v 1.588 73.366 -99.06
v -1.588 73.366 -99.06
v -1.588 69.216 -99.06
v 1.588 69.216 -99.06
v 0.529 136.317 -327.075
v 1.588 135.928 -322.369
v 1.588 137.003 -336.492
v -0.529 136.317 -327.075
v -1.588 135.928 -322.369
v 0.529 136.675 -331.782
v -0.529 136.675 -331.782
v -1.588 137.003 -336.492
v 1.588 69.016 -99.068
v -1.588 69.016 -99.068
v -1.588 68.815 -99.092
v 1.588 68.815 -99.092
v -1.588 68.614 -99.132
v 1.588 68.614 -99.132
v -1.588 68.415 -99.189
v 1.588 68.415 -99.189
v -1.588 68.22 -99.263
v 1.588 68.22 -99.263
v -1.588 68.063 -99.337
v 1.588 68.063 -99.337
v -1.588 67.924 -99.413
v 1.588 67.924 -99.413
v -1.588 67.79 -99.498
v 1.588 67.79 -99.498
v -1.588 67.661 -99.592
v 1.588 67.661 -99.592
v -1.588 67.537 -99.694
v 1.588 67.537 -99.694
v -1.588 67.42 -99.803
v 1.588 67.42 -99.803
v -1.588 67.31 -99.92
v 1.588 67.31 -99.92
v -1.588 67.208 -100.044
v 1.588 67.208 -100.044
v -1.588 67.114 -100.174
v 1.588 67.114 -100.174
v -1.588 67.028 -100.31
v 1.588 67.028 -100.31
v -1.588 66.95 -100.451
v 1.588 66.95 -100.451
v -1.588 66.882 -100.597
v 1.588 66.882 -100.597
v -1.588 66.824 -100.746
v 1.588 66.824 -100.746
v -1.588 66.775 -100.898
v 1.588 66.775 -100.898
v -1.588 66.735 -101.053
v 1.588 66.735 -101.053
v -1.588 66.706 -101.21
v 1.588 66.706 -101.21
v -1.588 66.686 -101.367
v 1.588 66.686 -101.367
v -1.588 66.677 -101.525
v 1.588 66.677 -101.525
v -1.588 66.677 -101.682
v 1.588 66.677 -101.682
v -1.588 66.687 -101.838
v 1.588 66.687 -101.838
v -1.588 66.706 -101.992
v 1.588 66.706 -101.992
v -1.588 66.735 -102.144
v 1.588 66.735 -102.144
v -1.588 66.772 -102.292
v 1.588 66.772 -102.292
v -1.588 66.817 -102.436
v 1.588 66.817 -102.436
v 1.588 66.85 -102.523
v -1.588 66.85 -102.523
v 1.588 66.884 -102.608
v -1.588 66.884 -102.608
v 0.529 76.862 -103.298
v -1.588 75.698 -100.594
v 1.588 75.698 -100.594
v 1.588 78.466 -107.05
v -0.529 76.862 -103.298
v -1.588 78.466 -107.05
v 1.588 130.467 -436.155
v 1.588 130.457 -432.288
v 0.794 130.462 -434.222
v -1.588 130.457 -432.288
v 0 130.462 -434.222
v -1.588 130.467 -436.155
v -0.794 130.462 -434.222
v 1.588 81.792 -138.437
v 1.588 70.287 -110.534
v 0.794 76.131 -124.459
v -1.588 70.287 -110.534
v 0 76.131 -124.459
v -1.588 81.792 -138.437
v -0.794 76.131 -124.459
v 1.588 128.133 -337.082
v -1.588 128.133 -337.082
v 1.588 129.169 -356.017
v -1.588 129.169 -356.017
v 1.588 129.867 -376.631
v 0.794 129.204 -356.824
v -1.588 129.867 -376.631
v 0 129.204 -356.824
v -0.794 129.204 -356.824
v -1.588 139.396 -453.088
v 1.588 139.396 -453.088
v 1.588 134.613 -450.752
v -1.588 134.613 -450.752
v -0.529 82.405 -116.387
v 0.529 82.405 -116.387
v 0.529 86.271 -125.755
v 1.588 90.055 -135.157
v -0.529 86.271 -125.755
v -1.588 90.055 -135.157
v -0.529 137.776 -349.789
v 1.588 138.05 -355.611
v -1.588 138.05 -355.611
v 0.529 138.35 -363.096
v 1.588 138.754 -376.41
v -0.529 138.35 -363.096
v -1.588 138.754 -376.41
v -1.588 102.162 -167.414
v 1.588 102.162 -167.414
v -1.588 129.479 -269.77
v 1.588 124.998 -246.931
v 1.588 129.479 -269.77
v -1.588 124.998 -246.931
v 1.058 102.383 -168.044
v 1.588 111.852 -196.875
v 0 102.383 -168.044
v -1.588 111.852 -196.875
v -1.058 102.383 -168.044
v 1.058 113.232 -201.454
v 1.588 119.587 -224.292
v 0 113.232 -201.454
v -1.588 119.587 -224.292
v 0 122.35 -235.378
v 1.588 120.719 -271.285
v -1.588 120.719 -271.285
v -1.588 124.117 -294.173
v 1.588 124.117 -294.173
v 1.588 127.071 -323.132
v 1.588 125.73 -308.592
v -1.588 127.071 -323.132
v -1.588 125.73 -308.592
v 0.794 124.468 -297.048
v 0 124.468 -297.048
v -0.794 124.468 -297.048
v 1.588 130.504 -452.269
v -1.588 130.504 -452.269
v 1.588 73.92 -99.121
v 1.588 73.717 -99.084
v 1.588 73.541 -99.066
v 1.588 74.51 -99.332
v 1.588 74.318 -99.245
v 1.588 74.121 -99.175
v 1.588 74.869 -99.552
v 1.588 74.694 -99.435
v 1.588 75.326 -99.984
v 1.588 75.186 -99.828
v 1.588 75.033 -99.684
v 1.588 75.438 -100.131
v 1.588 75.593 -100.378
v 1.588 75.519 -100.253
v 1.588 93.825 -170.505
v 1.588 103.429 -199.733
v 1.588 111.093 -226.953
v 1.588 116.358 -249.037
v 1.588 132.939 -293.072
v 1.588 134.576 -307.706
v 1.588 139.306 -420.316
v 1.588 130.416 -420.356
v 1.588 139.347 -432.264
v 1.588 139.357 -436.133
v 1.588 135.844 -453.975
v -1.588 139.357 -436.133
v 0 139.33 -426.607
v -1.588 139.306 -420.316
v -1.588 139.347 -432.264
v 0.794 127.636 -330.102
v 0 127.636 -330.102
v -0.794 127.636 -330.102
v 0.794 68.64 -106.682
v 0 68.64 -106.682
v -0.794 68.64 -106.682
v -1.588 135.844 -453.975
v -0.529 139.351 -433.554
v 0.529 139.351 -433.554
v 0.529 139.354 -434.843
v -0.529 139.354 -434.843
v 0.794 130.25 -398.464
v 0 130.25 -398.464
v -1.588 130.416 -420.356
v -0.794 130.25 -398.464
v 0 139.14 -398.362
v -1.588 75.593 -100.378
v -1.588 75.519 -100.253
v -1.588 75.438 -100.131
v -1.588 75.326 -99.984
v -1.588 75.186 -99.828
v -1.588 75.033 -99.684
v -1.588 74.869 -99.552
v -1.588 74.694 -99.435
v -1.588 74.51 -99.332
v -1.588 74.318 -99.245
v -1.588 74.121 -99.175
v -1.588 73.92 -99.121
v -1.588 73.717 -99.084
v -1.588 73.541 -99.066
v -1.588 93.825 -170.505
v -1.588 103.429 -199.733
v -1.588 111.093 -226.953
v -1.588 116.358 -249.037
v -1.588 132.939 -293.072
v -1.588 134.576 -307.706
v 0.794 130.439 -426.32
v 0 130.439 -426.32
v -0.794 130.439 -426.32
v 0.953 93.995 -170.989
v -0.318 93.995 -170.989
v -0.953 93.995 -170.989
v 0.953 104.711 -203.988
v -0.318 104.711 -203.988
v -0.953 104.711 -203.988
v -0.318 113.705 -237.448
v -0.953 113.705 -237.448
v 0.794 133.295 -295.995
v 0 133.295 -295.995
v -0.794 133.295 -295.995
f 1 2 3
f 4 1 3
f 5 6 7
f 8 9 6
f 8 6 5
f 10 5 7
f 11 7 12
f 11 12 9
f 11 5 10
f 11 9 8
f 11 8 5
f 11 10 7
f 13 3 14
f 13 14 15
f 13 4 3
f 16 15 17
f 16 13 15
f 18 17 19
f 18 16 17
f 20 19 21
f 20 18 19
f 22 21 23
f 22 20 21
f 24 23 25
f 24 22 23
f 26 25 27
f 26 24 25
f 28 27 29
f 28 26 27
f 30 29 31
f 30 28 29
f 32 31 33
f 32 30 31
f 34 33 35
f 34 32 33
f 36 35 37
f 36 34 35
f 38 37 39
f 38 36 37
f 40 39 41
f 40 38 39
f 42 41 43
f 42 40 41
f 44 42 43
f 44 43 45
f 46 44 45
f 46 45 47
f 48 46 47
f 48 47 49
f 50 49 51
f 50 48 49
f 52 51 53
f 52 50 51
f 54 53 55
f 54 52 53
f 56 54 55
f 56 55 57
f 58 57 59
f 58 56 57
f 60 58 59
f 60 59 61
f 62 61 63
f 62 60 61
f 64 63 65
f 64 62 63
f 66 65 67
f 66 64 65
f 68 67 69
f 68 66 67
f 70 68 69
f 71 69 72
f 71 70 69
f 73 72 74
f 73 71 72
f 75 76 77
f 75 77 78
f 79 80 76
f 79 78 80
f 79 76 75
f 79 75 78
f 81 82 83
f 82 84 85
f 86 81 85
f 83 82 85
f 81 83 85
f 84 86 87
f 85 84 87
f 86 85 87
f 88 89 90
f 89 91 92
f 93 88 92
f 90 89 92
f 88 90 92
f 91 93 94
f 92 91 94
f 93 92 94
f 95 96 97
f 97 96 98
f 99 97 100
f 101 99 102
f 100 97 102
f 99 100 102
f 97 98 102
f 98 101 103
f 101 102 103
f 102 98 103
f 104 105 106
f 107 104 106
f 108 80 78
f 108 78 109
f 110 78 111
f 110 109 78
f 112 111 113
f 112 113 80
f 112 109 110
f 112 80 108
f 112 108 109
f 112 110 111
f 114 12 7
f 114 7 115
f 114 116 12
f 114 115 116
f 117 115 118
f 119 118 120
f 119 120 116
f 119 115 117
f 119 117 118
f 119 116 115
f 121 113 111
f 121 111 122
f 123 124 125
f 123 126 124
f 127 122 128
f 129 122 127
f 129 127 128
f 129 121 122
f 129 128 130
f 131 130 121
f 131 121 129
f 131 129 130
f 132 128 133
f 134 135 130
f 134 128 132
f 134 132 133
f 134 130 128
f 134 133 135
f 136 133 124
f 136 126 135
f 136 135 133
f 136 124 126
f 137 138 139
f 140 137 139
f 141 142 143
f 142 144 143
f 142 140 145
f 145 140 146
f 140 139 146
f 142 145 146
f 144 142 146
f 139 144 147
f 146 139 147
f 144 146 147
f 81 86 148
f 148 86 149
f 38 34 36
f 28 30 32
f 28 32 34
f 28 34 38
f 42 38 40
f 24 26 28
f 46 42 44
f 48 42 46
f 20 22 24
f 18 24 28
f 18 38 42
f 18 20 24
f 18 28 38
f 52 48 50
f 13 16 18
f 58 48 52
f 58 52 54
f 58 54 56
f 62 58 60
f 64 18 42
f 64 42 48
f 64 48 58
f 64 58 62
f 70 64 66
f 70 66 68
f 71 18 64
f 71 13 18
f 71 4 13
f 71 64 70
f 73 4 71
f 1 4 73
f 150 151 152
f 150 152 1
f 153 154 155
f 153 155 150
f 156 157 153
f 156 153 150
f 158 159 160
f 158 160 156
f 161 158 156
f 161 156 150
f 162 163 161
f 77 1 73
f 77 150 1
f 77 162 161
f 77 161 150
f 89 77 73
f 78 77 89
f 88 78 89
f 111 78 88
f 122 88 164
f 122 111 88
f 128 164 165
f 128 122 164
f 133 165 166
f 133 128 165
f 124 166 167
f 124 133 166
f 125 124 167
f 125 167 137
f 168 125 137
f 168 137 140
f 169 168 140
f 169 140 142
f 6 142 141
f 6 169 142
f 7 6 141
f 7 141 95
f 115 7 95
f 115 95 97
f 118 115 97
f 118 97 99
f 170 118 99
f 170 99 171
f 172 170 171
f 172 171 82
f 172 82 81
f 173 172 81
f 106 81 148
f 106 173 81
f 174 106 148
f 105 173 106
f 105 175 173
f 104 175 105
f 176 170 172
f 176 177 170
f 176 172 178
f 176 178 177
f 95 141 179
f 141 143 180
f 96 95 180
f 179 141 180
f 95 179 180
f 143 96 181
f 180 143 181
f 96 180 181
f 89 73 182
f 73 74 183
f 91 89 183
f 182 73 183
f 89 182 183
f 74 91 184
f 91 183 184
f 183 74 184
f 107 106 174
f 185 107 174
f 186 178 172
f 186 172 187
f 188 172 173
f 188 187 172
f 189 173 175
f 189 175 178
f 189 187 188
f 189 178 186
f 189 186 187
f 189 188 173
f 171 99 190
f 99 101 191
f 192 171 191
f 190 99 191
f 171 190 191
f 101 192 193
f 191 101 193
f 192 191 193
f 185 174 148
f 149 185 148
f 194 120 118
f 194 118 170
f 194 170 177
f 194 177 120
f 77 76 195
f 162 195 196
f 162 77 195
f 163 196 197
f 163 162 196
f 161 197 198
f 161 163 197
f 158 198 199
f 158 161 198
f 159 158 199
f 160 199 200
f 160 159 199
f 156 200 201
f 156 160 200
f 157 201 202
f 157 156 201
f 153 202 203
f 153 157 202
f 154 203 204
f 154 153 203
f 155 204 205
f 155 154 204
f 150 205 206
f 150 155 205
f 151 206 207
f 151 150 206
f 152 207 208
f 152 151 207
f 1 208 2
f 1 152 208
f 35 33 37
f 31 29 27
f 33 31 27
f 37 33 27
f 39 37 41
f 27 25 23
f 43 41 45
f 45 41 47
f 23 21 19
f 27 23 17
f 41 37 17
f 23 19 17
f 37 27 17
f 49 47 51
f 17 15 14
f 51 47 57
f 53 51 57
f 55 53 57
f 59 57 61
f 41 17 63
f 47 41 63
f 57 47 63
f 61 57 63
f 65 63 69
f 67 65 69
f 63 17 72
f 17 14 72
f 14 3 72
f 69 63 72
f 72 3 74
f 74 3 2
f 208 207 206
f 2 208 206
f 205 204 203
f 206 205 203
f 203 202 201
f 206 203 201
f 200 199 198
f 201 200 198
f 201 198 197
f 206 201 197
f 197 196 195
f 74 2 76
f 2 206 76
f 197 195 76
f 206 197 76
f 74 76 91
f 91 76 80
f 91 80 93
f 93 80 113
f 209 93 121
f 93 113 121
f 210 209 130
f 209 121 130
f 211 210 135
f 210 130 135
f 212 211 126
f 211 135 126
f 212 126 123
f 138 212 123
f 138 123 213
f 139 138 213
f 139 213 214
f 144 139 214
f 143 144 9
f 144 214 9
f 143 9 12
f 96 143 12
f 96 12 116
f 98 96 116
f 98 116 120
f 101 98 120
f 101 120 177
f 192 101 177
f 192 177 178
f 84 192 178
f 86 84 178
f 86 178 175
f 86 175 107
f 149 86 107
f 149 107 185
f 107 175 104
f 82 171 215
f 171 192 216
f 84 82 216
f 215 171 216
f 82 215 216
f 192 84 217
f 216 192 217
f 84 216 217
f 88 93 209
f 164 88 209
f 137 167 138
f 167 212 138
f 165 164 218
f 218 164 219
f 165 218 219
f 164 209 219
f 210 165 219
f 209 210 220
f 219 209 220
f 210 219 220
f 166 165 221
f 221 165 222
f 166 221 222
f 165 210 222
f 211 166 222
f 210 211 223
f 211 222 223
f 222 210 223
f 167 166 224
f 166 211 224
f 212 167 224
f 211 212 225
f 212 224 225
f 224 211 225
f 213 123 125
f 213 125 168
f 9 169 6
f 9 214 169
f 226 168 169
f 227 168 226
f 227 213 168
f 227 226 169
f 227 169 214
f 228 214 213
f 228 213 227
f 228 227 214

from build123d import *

# Parameters (mm, degrees)
BOSS_EXTRUDE1_START = -1.5875
BOSS_EXTRUDE1_DEPTH = 3.175
FILLET1_R           = 2.54
CUT_EXTRUDE1_DEPTH  = 2674.191025632
FILLET2_R           = 0.762
FILLET3_R           = 0.762
CUT_EXTRUDE2_DEPTH  = 7.62


with BuildPart() as part:
    # Boss-Extrude1: read off the stored shape, not the designer's step
    # Boss-Extrude1 outline → Boss-Extrude1 (new body)
    with BuildSketch(Plane(origin=(0, 0, 0), x_dir=(0, 0, -1), z_dir=(1, 0, 0)).offset(BOSS_EXTRUDE1_START)):
        with BuildLine():
            add(Edge.make_bspline(
                [(1110.404970926, 130.384545774), (1120.170834465, 130.370061323), (1139.703057908, 130.338772026), (1168.998370974, 130.277673039), (1198.290610395, 130.194386876), (1217.81419633, 130.113940836), (1227.576506903, 130.06508052)],
                knots=[0, 0, 0, 0, 0.25, 0.5, 0.75, 1, 1, 1, 1], degree=3))
            add(Edge.make_bspline(
                [(1227.576506903, 130.06508052), (1269.911205773, 129.853195249), (1333.427746701, 129.273373321), (1418.042208161, 127.449050563), (1502.665994832, 124.913583682), (1608.454176987, 120.803299479), (1693.070073331, 116.848243245), (1735.369787733, 114.744712179)],
                knots=[0, 0, 0, 0, 0.25, 0.375, 0.5, 0.75, 1, 1, 1, 1], degree=3))
            add(Edge.make_bspline(
                [(1735.369787733, 114.744712179), (1815.995940723, 110.735232018), (1936.906650462, 104.096364548), (2098.049485168, 94.18797875), (2198.694736725, 87.314638509), (2279.130413747, 81.114418931), (2339.412950304, 76.034076608), (2399.564054334, 70.28270545), (2479.570468264, 61.127378254), (2559.292087872, 49.650907614), (2626.797554585, 38.235484735), (2656.889518578, 32.788503969), (2667.159793662, 30.877771266), (2669.54, 30.432069924)],
                knots=[0, 0, 0, 0, 0.25, 0.375, 0.5, 0.5625, 0.625, 0.6875, 0.75, 0.875, 0.9375, 0.96241067, 0.969928536, 0.969928536, 0.969928536, 0.969928536], degree=3))
            Line((2669.54, 30.432069924), (2669.54, 39.476142465))
            add(Edge.make_bspline(
                [(1735.811334709, 123.623740069), (1776.138635499, 121.618292624), (1816.460281579, 119.500621806), (1897.093668675, 115.087561885), (1937.405638896, 112.792971084), (2018.018419045, 108.018366523), (2058.319512223, 105.539122976), (2138.903780144, 100.307240032), (2179.18739793, 97.555127955), (2239.586998714, 93.080168687), (2259.716280977, 91.529837622), (2289.900442602, 89.09084343), (2299.960179135, 88.258845039), (2320.076004566, 86.552861654), (2330.132100898, 85.678962223), (2350.239356518, 83.874334847), (2360.290489794, 82.943307484), (2380.385973971, 81.003183297), (2390.430065378, 79.993418555), (2420.547026195, 76.827577532), (2440.60648589, 74.533672955), (2480.675569568, 69.556278523), (2500.68715183, 66.874150811), (2540.654290207, 61.150246295), (2560.611026428, 58.109755646), (2600.475457131, 51.702465574), (2620.382967089, 48.337538888), (2650.028116889, 43.072156367), (2659.78844051, 41.29687683), (2669.54, 39.476142465)],
                knots=[0, 0, 0, 0, 0.125, 0.125, 0.25, 0.25, 0.375, 0.375, 0.5, 0.5, 0.5625, 0.5625, 0.59375, 0.59375, 0.625, 0.625, 0.65625, 0.65625, 0.6875, 0.6875, 0.75, 0.75, 0.8125, 0.8125, 0.875, 0.875, 0.9375, 0.9375, 0.968210768, 0.968210768, 0.968210768, 0.968210768], degree=3))
            add(Edge.make_bspline(
                [(1227.621000751, 138.954969175), (1248.807303679, 138.848931677), (1269.993583155, 138.701170252), (1312.363832348, 138.270664618), (1333.547719008, 137.987407832), (1375.912368189, 137.249274813), (1397.09309738, 136.7925677), (1439.451328259, 135.701855835), (1460.629010312, 135.069210584), (1502.979101161, 133.670541385), (1524.152152736, 132.907434339), (1566.494303759, 131.284732459), (1587.663166024, 130.423163385), (1651.164052809, 127.709123983), (1693.490421561, 125.728325331), (1735.811334709, 123.623740069)],
                knots=[0, 0, 0, 0, 0.125, 0.125, 0.25, 0.25, 0.375, 0.375, 0.5, 0.5, 0.625, 0.625, 0.75, 0.75, 1, 1, 1, 1], degree=3))
            add(Edge.make_bspline(
                [(1110.418156307, 139.274535996), (1129.952027249, 139.245563914), (1149.485893504, 139.211997476), (1188.553558893, 139.115899087), (1208.087346834, 139.052735015), (1227.621000751, 138.954969175)],
                knots=[0, 0, 0, 0, 0.5, 0.5, 1, 1, 1, 1], degree=3))
            add(Edge.make_bspline(
                [(768.740124165, 138.468408213), (782.976796045, 138.460280143), (797.213453801, 138.479500079), (825.686695051, 138.549690296), (839.923258916, 138.600062665), (868.396318956, 138.719026333), (882.632808962, 138.789607972), (911.105746117, 138.939594729), (925.342197007, 139.018479563), (953.81517223, 139.160090703), (968.051699178, 139.222241505), (996.524919377, 139.30995407), (1010.761605517, 139.335014039), (1039.234912871, 139.349647552), (1053.471562869, 139.340493535), (1081.944860968, 139.313691902), (1096.181508981, 139.29565137), (1110.418156307, 139.274535996)],
                knots=[0, 0, 0, 0, 0.125, 0.125, 0.25, 0.25, 0.375, 0.375, 0.5, 0.5, 0.625, 0.625, 0.75, 0.75, 0.875, 0.875, 1, 1, 1, 1], degree=3))
            add(Edge.make_bspline(
                [(630.778432202, 139.251437536), (653.771819614, 139.075315664), (676.765000849, 138.871740519), (711.255349111, 138.647690701), (722.752238945, 138.586174182), (745.746099074, 138.499784896), (757.243084259, 138.474972158), (768.740124165, 138.468408213)],
                knots=[0, 0, 0, 0, 0.5, 0.5, 0.75, 0.75, 1, 1, 1, 1], degree=3))
            add(Edge.make_bspline(
                [(604.514984259, 139.433685568), (609.940743136, 139.400696354), (618.695242427, 139.342071397), (627.449694696, 139.276935028), (630.778432202, 139.251437536)],
                knots=[0, 0, 0, 0, 0.619765686, 1, 1, 1, 1], degree=3))
            ThreePointArc((604.514984259, 139.433685568), (600.549356142, 139.457173081), (596.583720644, 139.479379304))
            add(Edge.make_bspline(
                [(436.133018826, 139.357176562), (449.50393779, 139.390650739), (462.874888934, 139.412366015), (489.61665939, 139.498555977), (502.987497127, 139.559076553), (529.729299233, 139.628029754), (543.100240501, 139.639230481), (569.84212102, 139.601013959), (583.212960696, 139.552035302), (596.583720644, 139.479379304)],
                knots=[0, 0, 0, 0, 0.25, 0.25, 0.5, 0.5, 0.75, 0.75, 1, 1, 1, 1], degree=3))
            add(Edge.make_bspline(
                [(432.263917423, 139.347117104), (433.553617637, 139.350567112), (434.843318039, 139.353947814), (436.133018826, 139.357176562)],
                knots=[0, 0, 0, 0, 1, 1, 1, 1], degree=3))
            add(Edge.make_bspline(
                [(420.316232014, 139.305761868), (422.413235913, 139.315186344), (426.395793967, 139.330351666), (430.378363115, 139.342073082), (432.263917423, 139.347117104)],
                knots=[0, 0, 0, 0, 0.526548575, 1, 1, 1, 1], degree=3))
            add(Edge.make_bspline(
                [(376.410119779, 138.75403864), (383.726317086, 138.935561778), (391.043801196, 139.055611797), (405.679602634, 139.224192856), (412.997895507, 139.272871444), (420.316232014, 139.305761868)],
                knots=[0, 0, 0, 0, 0.5, 0.5, 1, 1, 1, 1], degree=3))
            add(Edge.make_bspline(
                [(336.49221538, 137.002990798), (349.782924989, 137.88646357), (363.094318653, 138.423658969), (376.410119779, 138.75403864)],
                knots=[0, 0, 0, 0, 1, 1, 1, 1], degree=3))
            add(Edge.make_bspline(
                [(322.369488076, 135.928469458), (327.073374868, 136.333386449), (331.781331813, 136.689844531), (336.49221538, 137.002990798)],
                knots=[0, 0, 0, 0, 1, 1, 1, 1], degree=3))
            add(Edge.make_bspline(
                [(269.769949315, 129.47895505), (274.123387467, 130.231879276), (278.485668028, 130.925946417), (287.22796256, 132.196043087), (291.608626646, 132.771988738), (300.381777496, 133.818422146), (304.774579419, 134.288963443), (313.567800313, 135.154375086), (317.967903853, 135.549407043), (322.369488076, 135.928469458)],
                knots=[0, 0, 0, 0, 0.25, 0.25, 0.5, 0.5, 0.75, 0.75, 1, 1, 1, 1], degree=3))
            add(Edge.make_bspline(
                [(135.15718457, 90.054634926), (146.043739673, 94.375230064), (156.99891695, 98.504335222), (173.56622243, 104.322560697), (179.110932848, 106.199810145), (190.24859245, 109.819698901), (195.841545849, 111.562316625), (207.065472514, 114.901345648), (212.697969124, 116.49836249), (224.005973618, 119.540534541), (229.683240596, 120.9862349), (246.767187276, 125.077694043), (258.225188059, 127.482295924), (269.769949315, 129.47895505)],
                knots=[0, 0, 0, 0, 0.25, 0.25, 0.375, 0.375, 0.5, 0.5, 0.625, 0.625, 0.75, 0.75, 1, 1, 1, 1], degree=3))
            add(Edge.make_bspline(
                [(107.049744533, 78.466050261), (116.373258882, 82.438606419), (125.737350123, 86.316143859), (135.15718457, 90.054634926)],
                knots=[0, 0, 0, 0, 1, 1, 1, 1], degree=3))
            add(Edge.make_bspline(
                [(99.06, 75.03568963), (99.223542669, 75.106424562), (100.635498802, 75.716852689), (103.297453866, 76.863328103), (105.798503999, 77.932922637), (107.049744533, 78.466050261)],
                knots=[0.484151133, 0.484151133, 0.484151133, 0.484151133, 0.515864471, 0.757931449, 1, 1, 1, 1], degree=3))
            Line((99.06, 75.03568963), (99.06, 65.345043949))
            add(Edge.make_bspline(
                [(99.06, 65.345043949), (99.380370965, 65.484464523), (100.637671455, 66.031176319), (103.17753745, 67.132002814), (106.681577323, 68.64166857), (109.249580285, 69.740028797), (110.534459652, 70.287489229)],
                knots=[0.254738807, 0.254738807, 0.254738807, 0.254738807, 0.317238807, 0.5, 0.75, 1, 1, 1, 1], degree=3))
            add(Edge.make_bspline(
                [(110.534459652, 70.287489229), (112.850658013, 71.274373329), (117.489277519, 73.236837099), (124.456688526, 76.138068453), (131.438476528, 78.994265342), (136.101204469, 80.864754132), (138.436571012, 81.791601309)],
                knots=[0, 0, 0, 0, 0.25, 0.5, 0.75, 1, 1, 1, 1], degree=3))
            add(Edge.make_bspline(
                [(138.436571012, 81.791601309), (143.826897197, 83.930883835), (154.6522834, 88.11877139), (176.408203186, 96.037596764), (203.906835742, 104.998187521), (237.39469787, 114.027149543), (259.934818065, 118.755998441), (271.284977744, 120.719001348)],
                knots=[0, 0, 0, 0, 0.125, 0.25, 0.5, 0.75, 1, 1, 1, 1], degree=3))
            add(Edge.make_bspline(
                [(271.284977744, 120.719001348), (275.558711595, 121.458140765), (284.124297478, 122.821139095), (297.036360548, 124.518896272), (310.018420247, 125.909880891), (318.766623126, 126.695286194), (323.13209925, 127.071239405)],
                knots=[5e-09, 5e-09, 5e-09, 5e-09, 0.2499992, 0.4999984, 0.7499976, 0.999996801, 0.999996801, 0.999996801, 0.999996801], degree=3))
            add(Edge.make_bspline(
                [(323.13209925, 127.071239405), (324.293050056, 127.171175344), (326.615168427, 127.365043892), (330.101568176, 127.638529754), (333.590184216, 127.895089457), (335.917953069, 128.055198639), (337.081858513, 128.132566852)],
                knots=[1.2024e-05, 1.2024e-05, 1.2024e-05, 1.2024e-05, 0.250009018, 0.500006012, 0.750003006, 1, 1, 1, 1], degree=3))
            add(Edge.make_bspline(
                [(337.081858513, 128.132566852), (340.367862287, 128.350997241), (346.939906877, 128.744909116), (356.821319657, 129.221190111), (366.716250393, 129.595096292), (373.326613137, 129.784797569), (376.630622597, 129.866773678)],
                knots=[0, 0, 0, 0, 0.25, 0.5, 0.75, 1, 1, 1, 1], degree=3))
            add(Edge.make_bspline(
                [(376.630622597, 129.866773678), (380.266394474, 129.956981294), (387.534764147, 130.106779908), (398.462206547, 130.259361028), (409.400972015, 130.358727994), (416.705417778, 130.39944419), (420.356185481, 130.415851648)],
                knots=[0, 0, 0, 0, 0.25, 0.5, 0.75, 1, 1, 1, 1], degree=3))
            add(Edge.make_bspline(
                [(420.356185481, 130.415851648), (421.350045129, 130.420318309), (423.337533562, 130.428603137), (426.320174328, 130.439402209), (429.303468332, 130.448883952), (431.293011648, 130.454488038), (432.287698861, 130.457148912)],
                knots=[0, 0, 0, 0, 0.25, 0.5, 0.75, 1, 1, 1, 1], degree=3))
            add(Edge.make_bspline(
                [(432.287698861, 130.457148912), (432.610032304, 130.45801117), (433.254717136, 130.45972707), (434.221637716, 130.462266911), (435.188505114, 130.464765142), (435.833012253, 130.466397641), (436.155274747, 130.46720442)],
                knots=[9.2e-08, 9.2e-08, 9.2e-08, 9.2e-08, 0.25, 0.5, 0.75, 1, 1, 1, 1], degree=3))
            add(Edge.make_bspline(
                [(436.155274747, 130.46720442), (449.528322363, 130.500683927), (476.275740382, 130.546633815), (516.38896029, 130.728798697), (556.456290895, 130.759667498), (583.176533448, 130.662101975), (596.535396133, 130.589510646)],
                knots=[0, 0, 0, 0, 0.249999973, 0.499999946, 0.749999918, 0.999999891, 0.999999891, 0.999999891, 0.999999891], degree=3))
            ThreePointArc((596.535396133, 130.589510646), (600.498158983, 130.567320504), (604.460914457, 130.543849998))
            add(Edge.make_bspline(
                [(604.460914457, 130.543849998), (606.648150431, 130.530551362), (611.022503017, 130.502867011), (617.584689429, 130.458405465), (624.147187284, 130.411339888), (628.522663802, 130.378455494), (630.7103385, 130.361698324)],
                knots=[-7.09e-07, -7.09e-07, -7.09e-07, -7.09e-07, 0.249999468, 0.499999646, 0.749999823, 1, 1, 1, 1], degree=3))
            add(Edge.make_bspline(
                [(630.7103385, 130.361698324), (642.206126489, 130.273644326), (665.193556095, 130.083785311), (699.699077953, 129.819212193), (734.21504011, 129.634735151), (757.228597075, 129.58497898), (768.735048644, 129.578409662)],
                knots=[0, 0, 0, 0, 0.25, 0.5, 0.75, 1, 1, 1, 1], degree=3))
            add(Edge.make_bspline(
                [(768.735048644, 129.578409662), (797.222409768, 129.56214552), (854.203652026, 129.725124503), (939.635195481, 130.236578518), (1024.992958464, 130.524931921), (1081.937612336, 130.426767717), (1110.404970926, 130.384545774)],
                knots=[0, 0, 0, 0, 0.25, 0.5, 0.75, 1, 1, 1, 1], degree=3))
        make_face()
    extrude(amount=BOSS_EXTRUDE1_DEPTH)

    # Fillet1
    fillet1_edges = [part.edges().sort_by_distance(p)[0] for p in [
        (0, 39.476142465, -2669.54),
        (0, 30.432069924, -2669.54),
        (0, 65.345043949, -99.06),
        (0, 75.03568963, -99.06),
    ]]
    fillet(fillet1_edges, radius=FILLET1_R)

    # Sketch4 → Cut-Extrude1 (cut, through all)
    with BuildSketch(Plane(origin=(1.5875, 0, 0), x_dir=(0, 0, -1), z_dir=(1, 0, 0))):
        Polygon((1827.2125, 118.895836595), (1827.2125, 110.000384115), (1827.2125, 78.791710134), (2135.1875, 78.791710134), (2135.1875, 91.599357392), (2135.1875, 100.508307819), (2135.1875, 129.353842083), (1827.2125, 129.353842083), align=None)
    extrude(amount=-CUT_EXTRUDE1_DEPTH, mode=Mode.SUBTRACT)


with BuildPart() as cut_extrude1_piece_1:
    # of the separate pieces the step leaves, piece 1, a body of its own (cut_extrude1_pieces)
    add(part.part.solids().sort_by_distance((-1.5875, 114.744712179, -1735.369787733))[0])

    # Fillet2
    fillet2_edges = [cut_extrude1_piece_1.edges().sort_by_distance(p)[0] for p in [
        (0, 118.895836595, -1827.2125),
        (0, 110.000384116, -1827.2125),
    ]]
    fillet(fillet2_edges, radius=FILLET2_R)


with BuildPart() as cut_extrude1_piece_2:
    # of the separate pieces the step leaves, piece 2, a body of its own (cut_extrude1_pieces)
    add(part.part.solids().sort_by_distance((-1.5875, 91.599357392, -2135.1875))[0])

    # Fillet3
    fillet3_edges = [cut_extrude1_piece_2.edges().sort_by_distance(p)[0] for p in [
        (0, 100.508307819, -2135.1875),
        (0, 91.599357392, -2135.1875),
    ]]
    fillet(fillet3_edges, radius=FILLET3_R)


with BuildPart() as cut_extrude2_tool:
    # Sketch5 → Cut-Extrude2 (new body)
    with BuildSketch(Plane(origin=(1.5875, 0, 0), x_dir=(0, 0, -1), z_dir=(1, 0, 0))):
        Polygon((453.088349995, 139.395824167), (450.752036301, 134.613422753), (453.975418286, 135.844351639), (452.268768997, 130.504363999), (452.268768997, 120.265529488), (2798.774335261, -181.4514548), (2948.646980362, 339.158786075), (453.088349995, 144.042560639), align=None)
    extrude(amount=-CUT_EXTRUDE2_DEPTH)


with BuildPart() as cut_extrude1_piece_1_1:
    add(cut_extrude1_piece_1.part)

    # Cut-Extrude2: cut by cut_extrude2_tool
    add(cut_extrude2_tool.part, mode=Mode.SUBTRACT)


with BuildPart() as cut_extrude1_piece_2_1:
    add(cut_extrude1_piece_2.part)

    # Cut-Extrude2: cut by cut_extrude2_tool
    add(cut_extrude2_tool.part, mode=Mode.SUBTRACT)


solid = cut_extrude1_piece_1_1.part
